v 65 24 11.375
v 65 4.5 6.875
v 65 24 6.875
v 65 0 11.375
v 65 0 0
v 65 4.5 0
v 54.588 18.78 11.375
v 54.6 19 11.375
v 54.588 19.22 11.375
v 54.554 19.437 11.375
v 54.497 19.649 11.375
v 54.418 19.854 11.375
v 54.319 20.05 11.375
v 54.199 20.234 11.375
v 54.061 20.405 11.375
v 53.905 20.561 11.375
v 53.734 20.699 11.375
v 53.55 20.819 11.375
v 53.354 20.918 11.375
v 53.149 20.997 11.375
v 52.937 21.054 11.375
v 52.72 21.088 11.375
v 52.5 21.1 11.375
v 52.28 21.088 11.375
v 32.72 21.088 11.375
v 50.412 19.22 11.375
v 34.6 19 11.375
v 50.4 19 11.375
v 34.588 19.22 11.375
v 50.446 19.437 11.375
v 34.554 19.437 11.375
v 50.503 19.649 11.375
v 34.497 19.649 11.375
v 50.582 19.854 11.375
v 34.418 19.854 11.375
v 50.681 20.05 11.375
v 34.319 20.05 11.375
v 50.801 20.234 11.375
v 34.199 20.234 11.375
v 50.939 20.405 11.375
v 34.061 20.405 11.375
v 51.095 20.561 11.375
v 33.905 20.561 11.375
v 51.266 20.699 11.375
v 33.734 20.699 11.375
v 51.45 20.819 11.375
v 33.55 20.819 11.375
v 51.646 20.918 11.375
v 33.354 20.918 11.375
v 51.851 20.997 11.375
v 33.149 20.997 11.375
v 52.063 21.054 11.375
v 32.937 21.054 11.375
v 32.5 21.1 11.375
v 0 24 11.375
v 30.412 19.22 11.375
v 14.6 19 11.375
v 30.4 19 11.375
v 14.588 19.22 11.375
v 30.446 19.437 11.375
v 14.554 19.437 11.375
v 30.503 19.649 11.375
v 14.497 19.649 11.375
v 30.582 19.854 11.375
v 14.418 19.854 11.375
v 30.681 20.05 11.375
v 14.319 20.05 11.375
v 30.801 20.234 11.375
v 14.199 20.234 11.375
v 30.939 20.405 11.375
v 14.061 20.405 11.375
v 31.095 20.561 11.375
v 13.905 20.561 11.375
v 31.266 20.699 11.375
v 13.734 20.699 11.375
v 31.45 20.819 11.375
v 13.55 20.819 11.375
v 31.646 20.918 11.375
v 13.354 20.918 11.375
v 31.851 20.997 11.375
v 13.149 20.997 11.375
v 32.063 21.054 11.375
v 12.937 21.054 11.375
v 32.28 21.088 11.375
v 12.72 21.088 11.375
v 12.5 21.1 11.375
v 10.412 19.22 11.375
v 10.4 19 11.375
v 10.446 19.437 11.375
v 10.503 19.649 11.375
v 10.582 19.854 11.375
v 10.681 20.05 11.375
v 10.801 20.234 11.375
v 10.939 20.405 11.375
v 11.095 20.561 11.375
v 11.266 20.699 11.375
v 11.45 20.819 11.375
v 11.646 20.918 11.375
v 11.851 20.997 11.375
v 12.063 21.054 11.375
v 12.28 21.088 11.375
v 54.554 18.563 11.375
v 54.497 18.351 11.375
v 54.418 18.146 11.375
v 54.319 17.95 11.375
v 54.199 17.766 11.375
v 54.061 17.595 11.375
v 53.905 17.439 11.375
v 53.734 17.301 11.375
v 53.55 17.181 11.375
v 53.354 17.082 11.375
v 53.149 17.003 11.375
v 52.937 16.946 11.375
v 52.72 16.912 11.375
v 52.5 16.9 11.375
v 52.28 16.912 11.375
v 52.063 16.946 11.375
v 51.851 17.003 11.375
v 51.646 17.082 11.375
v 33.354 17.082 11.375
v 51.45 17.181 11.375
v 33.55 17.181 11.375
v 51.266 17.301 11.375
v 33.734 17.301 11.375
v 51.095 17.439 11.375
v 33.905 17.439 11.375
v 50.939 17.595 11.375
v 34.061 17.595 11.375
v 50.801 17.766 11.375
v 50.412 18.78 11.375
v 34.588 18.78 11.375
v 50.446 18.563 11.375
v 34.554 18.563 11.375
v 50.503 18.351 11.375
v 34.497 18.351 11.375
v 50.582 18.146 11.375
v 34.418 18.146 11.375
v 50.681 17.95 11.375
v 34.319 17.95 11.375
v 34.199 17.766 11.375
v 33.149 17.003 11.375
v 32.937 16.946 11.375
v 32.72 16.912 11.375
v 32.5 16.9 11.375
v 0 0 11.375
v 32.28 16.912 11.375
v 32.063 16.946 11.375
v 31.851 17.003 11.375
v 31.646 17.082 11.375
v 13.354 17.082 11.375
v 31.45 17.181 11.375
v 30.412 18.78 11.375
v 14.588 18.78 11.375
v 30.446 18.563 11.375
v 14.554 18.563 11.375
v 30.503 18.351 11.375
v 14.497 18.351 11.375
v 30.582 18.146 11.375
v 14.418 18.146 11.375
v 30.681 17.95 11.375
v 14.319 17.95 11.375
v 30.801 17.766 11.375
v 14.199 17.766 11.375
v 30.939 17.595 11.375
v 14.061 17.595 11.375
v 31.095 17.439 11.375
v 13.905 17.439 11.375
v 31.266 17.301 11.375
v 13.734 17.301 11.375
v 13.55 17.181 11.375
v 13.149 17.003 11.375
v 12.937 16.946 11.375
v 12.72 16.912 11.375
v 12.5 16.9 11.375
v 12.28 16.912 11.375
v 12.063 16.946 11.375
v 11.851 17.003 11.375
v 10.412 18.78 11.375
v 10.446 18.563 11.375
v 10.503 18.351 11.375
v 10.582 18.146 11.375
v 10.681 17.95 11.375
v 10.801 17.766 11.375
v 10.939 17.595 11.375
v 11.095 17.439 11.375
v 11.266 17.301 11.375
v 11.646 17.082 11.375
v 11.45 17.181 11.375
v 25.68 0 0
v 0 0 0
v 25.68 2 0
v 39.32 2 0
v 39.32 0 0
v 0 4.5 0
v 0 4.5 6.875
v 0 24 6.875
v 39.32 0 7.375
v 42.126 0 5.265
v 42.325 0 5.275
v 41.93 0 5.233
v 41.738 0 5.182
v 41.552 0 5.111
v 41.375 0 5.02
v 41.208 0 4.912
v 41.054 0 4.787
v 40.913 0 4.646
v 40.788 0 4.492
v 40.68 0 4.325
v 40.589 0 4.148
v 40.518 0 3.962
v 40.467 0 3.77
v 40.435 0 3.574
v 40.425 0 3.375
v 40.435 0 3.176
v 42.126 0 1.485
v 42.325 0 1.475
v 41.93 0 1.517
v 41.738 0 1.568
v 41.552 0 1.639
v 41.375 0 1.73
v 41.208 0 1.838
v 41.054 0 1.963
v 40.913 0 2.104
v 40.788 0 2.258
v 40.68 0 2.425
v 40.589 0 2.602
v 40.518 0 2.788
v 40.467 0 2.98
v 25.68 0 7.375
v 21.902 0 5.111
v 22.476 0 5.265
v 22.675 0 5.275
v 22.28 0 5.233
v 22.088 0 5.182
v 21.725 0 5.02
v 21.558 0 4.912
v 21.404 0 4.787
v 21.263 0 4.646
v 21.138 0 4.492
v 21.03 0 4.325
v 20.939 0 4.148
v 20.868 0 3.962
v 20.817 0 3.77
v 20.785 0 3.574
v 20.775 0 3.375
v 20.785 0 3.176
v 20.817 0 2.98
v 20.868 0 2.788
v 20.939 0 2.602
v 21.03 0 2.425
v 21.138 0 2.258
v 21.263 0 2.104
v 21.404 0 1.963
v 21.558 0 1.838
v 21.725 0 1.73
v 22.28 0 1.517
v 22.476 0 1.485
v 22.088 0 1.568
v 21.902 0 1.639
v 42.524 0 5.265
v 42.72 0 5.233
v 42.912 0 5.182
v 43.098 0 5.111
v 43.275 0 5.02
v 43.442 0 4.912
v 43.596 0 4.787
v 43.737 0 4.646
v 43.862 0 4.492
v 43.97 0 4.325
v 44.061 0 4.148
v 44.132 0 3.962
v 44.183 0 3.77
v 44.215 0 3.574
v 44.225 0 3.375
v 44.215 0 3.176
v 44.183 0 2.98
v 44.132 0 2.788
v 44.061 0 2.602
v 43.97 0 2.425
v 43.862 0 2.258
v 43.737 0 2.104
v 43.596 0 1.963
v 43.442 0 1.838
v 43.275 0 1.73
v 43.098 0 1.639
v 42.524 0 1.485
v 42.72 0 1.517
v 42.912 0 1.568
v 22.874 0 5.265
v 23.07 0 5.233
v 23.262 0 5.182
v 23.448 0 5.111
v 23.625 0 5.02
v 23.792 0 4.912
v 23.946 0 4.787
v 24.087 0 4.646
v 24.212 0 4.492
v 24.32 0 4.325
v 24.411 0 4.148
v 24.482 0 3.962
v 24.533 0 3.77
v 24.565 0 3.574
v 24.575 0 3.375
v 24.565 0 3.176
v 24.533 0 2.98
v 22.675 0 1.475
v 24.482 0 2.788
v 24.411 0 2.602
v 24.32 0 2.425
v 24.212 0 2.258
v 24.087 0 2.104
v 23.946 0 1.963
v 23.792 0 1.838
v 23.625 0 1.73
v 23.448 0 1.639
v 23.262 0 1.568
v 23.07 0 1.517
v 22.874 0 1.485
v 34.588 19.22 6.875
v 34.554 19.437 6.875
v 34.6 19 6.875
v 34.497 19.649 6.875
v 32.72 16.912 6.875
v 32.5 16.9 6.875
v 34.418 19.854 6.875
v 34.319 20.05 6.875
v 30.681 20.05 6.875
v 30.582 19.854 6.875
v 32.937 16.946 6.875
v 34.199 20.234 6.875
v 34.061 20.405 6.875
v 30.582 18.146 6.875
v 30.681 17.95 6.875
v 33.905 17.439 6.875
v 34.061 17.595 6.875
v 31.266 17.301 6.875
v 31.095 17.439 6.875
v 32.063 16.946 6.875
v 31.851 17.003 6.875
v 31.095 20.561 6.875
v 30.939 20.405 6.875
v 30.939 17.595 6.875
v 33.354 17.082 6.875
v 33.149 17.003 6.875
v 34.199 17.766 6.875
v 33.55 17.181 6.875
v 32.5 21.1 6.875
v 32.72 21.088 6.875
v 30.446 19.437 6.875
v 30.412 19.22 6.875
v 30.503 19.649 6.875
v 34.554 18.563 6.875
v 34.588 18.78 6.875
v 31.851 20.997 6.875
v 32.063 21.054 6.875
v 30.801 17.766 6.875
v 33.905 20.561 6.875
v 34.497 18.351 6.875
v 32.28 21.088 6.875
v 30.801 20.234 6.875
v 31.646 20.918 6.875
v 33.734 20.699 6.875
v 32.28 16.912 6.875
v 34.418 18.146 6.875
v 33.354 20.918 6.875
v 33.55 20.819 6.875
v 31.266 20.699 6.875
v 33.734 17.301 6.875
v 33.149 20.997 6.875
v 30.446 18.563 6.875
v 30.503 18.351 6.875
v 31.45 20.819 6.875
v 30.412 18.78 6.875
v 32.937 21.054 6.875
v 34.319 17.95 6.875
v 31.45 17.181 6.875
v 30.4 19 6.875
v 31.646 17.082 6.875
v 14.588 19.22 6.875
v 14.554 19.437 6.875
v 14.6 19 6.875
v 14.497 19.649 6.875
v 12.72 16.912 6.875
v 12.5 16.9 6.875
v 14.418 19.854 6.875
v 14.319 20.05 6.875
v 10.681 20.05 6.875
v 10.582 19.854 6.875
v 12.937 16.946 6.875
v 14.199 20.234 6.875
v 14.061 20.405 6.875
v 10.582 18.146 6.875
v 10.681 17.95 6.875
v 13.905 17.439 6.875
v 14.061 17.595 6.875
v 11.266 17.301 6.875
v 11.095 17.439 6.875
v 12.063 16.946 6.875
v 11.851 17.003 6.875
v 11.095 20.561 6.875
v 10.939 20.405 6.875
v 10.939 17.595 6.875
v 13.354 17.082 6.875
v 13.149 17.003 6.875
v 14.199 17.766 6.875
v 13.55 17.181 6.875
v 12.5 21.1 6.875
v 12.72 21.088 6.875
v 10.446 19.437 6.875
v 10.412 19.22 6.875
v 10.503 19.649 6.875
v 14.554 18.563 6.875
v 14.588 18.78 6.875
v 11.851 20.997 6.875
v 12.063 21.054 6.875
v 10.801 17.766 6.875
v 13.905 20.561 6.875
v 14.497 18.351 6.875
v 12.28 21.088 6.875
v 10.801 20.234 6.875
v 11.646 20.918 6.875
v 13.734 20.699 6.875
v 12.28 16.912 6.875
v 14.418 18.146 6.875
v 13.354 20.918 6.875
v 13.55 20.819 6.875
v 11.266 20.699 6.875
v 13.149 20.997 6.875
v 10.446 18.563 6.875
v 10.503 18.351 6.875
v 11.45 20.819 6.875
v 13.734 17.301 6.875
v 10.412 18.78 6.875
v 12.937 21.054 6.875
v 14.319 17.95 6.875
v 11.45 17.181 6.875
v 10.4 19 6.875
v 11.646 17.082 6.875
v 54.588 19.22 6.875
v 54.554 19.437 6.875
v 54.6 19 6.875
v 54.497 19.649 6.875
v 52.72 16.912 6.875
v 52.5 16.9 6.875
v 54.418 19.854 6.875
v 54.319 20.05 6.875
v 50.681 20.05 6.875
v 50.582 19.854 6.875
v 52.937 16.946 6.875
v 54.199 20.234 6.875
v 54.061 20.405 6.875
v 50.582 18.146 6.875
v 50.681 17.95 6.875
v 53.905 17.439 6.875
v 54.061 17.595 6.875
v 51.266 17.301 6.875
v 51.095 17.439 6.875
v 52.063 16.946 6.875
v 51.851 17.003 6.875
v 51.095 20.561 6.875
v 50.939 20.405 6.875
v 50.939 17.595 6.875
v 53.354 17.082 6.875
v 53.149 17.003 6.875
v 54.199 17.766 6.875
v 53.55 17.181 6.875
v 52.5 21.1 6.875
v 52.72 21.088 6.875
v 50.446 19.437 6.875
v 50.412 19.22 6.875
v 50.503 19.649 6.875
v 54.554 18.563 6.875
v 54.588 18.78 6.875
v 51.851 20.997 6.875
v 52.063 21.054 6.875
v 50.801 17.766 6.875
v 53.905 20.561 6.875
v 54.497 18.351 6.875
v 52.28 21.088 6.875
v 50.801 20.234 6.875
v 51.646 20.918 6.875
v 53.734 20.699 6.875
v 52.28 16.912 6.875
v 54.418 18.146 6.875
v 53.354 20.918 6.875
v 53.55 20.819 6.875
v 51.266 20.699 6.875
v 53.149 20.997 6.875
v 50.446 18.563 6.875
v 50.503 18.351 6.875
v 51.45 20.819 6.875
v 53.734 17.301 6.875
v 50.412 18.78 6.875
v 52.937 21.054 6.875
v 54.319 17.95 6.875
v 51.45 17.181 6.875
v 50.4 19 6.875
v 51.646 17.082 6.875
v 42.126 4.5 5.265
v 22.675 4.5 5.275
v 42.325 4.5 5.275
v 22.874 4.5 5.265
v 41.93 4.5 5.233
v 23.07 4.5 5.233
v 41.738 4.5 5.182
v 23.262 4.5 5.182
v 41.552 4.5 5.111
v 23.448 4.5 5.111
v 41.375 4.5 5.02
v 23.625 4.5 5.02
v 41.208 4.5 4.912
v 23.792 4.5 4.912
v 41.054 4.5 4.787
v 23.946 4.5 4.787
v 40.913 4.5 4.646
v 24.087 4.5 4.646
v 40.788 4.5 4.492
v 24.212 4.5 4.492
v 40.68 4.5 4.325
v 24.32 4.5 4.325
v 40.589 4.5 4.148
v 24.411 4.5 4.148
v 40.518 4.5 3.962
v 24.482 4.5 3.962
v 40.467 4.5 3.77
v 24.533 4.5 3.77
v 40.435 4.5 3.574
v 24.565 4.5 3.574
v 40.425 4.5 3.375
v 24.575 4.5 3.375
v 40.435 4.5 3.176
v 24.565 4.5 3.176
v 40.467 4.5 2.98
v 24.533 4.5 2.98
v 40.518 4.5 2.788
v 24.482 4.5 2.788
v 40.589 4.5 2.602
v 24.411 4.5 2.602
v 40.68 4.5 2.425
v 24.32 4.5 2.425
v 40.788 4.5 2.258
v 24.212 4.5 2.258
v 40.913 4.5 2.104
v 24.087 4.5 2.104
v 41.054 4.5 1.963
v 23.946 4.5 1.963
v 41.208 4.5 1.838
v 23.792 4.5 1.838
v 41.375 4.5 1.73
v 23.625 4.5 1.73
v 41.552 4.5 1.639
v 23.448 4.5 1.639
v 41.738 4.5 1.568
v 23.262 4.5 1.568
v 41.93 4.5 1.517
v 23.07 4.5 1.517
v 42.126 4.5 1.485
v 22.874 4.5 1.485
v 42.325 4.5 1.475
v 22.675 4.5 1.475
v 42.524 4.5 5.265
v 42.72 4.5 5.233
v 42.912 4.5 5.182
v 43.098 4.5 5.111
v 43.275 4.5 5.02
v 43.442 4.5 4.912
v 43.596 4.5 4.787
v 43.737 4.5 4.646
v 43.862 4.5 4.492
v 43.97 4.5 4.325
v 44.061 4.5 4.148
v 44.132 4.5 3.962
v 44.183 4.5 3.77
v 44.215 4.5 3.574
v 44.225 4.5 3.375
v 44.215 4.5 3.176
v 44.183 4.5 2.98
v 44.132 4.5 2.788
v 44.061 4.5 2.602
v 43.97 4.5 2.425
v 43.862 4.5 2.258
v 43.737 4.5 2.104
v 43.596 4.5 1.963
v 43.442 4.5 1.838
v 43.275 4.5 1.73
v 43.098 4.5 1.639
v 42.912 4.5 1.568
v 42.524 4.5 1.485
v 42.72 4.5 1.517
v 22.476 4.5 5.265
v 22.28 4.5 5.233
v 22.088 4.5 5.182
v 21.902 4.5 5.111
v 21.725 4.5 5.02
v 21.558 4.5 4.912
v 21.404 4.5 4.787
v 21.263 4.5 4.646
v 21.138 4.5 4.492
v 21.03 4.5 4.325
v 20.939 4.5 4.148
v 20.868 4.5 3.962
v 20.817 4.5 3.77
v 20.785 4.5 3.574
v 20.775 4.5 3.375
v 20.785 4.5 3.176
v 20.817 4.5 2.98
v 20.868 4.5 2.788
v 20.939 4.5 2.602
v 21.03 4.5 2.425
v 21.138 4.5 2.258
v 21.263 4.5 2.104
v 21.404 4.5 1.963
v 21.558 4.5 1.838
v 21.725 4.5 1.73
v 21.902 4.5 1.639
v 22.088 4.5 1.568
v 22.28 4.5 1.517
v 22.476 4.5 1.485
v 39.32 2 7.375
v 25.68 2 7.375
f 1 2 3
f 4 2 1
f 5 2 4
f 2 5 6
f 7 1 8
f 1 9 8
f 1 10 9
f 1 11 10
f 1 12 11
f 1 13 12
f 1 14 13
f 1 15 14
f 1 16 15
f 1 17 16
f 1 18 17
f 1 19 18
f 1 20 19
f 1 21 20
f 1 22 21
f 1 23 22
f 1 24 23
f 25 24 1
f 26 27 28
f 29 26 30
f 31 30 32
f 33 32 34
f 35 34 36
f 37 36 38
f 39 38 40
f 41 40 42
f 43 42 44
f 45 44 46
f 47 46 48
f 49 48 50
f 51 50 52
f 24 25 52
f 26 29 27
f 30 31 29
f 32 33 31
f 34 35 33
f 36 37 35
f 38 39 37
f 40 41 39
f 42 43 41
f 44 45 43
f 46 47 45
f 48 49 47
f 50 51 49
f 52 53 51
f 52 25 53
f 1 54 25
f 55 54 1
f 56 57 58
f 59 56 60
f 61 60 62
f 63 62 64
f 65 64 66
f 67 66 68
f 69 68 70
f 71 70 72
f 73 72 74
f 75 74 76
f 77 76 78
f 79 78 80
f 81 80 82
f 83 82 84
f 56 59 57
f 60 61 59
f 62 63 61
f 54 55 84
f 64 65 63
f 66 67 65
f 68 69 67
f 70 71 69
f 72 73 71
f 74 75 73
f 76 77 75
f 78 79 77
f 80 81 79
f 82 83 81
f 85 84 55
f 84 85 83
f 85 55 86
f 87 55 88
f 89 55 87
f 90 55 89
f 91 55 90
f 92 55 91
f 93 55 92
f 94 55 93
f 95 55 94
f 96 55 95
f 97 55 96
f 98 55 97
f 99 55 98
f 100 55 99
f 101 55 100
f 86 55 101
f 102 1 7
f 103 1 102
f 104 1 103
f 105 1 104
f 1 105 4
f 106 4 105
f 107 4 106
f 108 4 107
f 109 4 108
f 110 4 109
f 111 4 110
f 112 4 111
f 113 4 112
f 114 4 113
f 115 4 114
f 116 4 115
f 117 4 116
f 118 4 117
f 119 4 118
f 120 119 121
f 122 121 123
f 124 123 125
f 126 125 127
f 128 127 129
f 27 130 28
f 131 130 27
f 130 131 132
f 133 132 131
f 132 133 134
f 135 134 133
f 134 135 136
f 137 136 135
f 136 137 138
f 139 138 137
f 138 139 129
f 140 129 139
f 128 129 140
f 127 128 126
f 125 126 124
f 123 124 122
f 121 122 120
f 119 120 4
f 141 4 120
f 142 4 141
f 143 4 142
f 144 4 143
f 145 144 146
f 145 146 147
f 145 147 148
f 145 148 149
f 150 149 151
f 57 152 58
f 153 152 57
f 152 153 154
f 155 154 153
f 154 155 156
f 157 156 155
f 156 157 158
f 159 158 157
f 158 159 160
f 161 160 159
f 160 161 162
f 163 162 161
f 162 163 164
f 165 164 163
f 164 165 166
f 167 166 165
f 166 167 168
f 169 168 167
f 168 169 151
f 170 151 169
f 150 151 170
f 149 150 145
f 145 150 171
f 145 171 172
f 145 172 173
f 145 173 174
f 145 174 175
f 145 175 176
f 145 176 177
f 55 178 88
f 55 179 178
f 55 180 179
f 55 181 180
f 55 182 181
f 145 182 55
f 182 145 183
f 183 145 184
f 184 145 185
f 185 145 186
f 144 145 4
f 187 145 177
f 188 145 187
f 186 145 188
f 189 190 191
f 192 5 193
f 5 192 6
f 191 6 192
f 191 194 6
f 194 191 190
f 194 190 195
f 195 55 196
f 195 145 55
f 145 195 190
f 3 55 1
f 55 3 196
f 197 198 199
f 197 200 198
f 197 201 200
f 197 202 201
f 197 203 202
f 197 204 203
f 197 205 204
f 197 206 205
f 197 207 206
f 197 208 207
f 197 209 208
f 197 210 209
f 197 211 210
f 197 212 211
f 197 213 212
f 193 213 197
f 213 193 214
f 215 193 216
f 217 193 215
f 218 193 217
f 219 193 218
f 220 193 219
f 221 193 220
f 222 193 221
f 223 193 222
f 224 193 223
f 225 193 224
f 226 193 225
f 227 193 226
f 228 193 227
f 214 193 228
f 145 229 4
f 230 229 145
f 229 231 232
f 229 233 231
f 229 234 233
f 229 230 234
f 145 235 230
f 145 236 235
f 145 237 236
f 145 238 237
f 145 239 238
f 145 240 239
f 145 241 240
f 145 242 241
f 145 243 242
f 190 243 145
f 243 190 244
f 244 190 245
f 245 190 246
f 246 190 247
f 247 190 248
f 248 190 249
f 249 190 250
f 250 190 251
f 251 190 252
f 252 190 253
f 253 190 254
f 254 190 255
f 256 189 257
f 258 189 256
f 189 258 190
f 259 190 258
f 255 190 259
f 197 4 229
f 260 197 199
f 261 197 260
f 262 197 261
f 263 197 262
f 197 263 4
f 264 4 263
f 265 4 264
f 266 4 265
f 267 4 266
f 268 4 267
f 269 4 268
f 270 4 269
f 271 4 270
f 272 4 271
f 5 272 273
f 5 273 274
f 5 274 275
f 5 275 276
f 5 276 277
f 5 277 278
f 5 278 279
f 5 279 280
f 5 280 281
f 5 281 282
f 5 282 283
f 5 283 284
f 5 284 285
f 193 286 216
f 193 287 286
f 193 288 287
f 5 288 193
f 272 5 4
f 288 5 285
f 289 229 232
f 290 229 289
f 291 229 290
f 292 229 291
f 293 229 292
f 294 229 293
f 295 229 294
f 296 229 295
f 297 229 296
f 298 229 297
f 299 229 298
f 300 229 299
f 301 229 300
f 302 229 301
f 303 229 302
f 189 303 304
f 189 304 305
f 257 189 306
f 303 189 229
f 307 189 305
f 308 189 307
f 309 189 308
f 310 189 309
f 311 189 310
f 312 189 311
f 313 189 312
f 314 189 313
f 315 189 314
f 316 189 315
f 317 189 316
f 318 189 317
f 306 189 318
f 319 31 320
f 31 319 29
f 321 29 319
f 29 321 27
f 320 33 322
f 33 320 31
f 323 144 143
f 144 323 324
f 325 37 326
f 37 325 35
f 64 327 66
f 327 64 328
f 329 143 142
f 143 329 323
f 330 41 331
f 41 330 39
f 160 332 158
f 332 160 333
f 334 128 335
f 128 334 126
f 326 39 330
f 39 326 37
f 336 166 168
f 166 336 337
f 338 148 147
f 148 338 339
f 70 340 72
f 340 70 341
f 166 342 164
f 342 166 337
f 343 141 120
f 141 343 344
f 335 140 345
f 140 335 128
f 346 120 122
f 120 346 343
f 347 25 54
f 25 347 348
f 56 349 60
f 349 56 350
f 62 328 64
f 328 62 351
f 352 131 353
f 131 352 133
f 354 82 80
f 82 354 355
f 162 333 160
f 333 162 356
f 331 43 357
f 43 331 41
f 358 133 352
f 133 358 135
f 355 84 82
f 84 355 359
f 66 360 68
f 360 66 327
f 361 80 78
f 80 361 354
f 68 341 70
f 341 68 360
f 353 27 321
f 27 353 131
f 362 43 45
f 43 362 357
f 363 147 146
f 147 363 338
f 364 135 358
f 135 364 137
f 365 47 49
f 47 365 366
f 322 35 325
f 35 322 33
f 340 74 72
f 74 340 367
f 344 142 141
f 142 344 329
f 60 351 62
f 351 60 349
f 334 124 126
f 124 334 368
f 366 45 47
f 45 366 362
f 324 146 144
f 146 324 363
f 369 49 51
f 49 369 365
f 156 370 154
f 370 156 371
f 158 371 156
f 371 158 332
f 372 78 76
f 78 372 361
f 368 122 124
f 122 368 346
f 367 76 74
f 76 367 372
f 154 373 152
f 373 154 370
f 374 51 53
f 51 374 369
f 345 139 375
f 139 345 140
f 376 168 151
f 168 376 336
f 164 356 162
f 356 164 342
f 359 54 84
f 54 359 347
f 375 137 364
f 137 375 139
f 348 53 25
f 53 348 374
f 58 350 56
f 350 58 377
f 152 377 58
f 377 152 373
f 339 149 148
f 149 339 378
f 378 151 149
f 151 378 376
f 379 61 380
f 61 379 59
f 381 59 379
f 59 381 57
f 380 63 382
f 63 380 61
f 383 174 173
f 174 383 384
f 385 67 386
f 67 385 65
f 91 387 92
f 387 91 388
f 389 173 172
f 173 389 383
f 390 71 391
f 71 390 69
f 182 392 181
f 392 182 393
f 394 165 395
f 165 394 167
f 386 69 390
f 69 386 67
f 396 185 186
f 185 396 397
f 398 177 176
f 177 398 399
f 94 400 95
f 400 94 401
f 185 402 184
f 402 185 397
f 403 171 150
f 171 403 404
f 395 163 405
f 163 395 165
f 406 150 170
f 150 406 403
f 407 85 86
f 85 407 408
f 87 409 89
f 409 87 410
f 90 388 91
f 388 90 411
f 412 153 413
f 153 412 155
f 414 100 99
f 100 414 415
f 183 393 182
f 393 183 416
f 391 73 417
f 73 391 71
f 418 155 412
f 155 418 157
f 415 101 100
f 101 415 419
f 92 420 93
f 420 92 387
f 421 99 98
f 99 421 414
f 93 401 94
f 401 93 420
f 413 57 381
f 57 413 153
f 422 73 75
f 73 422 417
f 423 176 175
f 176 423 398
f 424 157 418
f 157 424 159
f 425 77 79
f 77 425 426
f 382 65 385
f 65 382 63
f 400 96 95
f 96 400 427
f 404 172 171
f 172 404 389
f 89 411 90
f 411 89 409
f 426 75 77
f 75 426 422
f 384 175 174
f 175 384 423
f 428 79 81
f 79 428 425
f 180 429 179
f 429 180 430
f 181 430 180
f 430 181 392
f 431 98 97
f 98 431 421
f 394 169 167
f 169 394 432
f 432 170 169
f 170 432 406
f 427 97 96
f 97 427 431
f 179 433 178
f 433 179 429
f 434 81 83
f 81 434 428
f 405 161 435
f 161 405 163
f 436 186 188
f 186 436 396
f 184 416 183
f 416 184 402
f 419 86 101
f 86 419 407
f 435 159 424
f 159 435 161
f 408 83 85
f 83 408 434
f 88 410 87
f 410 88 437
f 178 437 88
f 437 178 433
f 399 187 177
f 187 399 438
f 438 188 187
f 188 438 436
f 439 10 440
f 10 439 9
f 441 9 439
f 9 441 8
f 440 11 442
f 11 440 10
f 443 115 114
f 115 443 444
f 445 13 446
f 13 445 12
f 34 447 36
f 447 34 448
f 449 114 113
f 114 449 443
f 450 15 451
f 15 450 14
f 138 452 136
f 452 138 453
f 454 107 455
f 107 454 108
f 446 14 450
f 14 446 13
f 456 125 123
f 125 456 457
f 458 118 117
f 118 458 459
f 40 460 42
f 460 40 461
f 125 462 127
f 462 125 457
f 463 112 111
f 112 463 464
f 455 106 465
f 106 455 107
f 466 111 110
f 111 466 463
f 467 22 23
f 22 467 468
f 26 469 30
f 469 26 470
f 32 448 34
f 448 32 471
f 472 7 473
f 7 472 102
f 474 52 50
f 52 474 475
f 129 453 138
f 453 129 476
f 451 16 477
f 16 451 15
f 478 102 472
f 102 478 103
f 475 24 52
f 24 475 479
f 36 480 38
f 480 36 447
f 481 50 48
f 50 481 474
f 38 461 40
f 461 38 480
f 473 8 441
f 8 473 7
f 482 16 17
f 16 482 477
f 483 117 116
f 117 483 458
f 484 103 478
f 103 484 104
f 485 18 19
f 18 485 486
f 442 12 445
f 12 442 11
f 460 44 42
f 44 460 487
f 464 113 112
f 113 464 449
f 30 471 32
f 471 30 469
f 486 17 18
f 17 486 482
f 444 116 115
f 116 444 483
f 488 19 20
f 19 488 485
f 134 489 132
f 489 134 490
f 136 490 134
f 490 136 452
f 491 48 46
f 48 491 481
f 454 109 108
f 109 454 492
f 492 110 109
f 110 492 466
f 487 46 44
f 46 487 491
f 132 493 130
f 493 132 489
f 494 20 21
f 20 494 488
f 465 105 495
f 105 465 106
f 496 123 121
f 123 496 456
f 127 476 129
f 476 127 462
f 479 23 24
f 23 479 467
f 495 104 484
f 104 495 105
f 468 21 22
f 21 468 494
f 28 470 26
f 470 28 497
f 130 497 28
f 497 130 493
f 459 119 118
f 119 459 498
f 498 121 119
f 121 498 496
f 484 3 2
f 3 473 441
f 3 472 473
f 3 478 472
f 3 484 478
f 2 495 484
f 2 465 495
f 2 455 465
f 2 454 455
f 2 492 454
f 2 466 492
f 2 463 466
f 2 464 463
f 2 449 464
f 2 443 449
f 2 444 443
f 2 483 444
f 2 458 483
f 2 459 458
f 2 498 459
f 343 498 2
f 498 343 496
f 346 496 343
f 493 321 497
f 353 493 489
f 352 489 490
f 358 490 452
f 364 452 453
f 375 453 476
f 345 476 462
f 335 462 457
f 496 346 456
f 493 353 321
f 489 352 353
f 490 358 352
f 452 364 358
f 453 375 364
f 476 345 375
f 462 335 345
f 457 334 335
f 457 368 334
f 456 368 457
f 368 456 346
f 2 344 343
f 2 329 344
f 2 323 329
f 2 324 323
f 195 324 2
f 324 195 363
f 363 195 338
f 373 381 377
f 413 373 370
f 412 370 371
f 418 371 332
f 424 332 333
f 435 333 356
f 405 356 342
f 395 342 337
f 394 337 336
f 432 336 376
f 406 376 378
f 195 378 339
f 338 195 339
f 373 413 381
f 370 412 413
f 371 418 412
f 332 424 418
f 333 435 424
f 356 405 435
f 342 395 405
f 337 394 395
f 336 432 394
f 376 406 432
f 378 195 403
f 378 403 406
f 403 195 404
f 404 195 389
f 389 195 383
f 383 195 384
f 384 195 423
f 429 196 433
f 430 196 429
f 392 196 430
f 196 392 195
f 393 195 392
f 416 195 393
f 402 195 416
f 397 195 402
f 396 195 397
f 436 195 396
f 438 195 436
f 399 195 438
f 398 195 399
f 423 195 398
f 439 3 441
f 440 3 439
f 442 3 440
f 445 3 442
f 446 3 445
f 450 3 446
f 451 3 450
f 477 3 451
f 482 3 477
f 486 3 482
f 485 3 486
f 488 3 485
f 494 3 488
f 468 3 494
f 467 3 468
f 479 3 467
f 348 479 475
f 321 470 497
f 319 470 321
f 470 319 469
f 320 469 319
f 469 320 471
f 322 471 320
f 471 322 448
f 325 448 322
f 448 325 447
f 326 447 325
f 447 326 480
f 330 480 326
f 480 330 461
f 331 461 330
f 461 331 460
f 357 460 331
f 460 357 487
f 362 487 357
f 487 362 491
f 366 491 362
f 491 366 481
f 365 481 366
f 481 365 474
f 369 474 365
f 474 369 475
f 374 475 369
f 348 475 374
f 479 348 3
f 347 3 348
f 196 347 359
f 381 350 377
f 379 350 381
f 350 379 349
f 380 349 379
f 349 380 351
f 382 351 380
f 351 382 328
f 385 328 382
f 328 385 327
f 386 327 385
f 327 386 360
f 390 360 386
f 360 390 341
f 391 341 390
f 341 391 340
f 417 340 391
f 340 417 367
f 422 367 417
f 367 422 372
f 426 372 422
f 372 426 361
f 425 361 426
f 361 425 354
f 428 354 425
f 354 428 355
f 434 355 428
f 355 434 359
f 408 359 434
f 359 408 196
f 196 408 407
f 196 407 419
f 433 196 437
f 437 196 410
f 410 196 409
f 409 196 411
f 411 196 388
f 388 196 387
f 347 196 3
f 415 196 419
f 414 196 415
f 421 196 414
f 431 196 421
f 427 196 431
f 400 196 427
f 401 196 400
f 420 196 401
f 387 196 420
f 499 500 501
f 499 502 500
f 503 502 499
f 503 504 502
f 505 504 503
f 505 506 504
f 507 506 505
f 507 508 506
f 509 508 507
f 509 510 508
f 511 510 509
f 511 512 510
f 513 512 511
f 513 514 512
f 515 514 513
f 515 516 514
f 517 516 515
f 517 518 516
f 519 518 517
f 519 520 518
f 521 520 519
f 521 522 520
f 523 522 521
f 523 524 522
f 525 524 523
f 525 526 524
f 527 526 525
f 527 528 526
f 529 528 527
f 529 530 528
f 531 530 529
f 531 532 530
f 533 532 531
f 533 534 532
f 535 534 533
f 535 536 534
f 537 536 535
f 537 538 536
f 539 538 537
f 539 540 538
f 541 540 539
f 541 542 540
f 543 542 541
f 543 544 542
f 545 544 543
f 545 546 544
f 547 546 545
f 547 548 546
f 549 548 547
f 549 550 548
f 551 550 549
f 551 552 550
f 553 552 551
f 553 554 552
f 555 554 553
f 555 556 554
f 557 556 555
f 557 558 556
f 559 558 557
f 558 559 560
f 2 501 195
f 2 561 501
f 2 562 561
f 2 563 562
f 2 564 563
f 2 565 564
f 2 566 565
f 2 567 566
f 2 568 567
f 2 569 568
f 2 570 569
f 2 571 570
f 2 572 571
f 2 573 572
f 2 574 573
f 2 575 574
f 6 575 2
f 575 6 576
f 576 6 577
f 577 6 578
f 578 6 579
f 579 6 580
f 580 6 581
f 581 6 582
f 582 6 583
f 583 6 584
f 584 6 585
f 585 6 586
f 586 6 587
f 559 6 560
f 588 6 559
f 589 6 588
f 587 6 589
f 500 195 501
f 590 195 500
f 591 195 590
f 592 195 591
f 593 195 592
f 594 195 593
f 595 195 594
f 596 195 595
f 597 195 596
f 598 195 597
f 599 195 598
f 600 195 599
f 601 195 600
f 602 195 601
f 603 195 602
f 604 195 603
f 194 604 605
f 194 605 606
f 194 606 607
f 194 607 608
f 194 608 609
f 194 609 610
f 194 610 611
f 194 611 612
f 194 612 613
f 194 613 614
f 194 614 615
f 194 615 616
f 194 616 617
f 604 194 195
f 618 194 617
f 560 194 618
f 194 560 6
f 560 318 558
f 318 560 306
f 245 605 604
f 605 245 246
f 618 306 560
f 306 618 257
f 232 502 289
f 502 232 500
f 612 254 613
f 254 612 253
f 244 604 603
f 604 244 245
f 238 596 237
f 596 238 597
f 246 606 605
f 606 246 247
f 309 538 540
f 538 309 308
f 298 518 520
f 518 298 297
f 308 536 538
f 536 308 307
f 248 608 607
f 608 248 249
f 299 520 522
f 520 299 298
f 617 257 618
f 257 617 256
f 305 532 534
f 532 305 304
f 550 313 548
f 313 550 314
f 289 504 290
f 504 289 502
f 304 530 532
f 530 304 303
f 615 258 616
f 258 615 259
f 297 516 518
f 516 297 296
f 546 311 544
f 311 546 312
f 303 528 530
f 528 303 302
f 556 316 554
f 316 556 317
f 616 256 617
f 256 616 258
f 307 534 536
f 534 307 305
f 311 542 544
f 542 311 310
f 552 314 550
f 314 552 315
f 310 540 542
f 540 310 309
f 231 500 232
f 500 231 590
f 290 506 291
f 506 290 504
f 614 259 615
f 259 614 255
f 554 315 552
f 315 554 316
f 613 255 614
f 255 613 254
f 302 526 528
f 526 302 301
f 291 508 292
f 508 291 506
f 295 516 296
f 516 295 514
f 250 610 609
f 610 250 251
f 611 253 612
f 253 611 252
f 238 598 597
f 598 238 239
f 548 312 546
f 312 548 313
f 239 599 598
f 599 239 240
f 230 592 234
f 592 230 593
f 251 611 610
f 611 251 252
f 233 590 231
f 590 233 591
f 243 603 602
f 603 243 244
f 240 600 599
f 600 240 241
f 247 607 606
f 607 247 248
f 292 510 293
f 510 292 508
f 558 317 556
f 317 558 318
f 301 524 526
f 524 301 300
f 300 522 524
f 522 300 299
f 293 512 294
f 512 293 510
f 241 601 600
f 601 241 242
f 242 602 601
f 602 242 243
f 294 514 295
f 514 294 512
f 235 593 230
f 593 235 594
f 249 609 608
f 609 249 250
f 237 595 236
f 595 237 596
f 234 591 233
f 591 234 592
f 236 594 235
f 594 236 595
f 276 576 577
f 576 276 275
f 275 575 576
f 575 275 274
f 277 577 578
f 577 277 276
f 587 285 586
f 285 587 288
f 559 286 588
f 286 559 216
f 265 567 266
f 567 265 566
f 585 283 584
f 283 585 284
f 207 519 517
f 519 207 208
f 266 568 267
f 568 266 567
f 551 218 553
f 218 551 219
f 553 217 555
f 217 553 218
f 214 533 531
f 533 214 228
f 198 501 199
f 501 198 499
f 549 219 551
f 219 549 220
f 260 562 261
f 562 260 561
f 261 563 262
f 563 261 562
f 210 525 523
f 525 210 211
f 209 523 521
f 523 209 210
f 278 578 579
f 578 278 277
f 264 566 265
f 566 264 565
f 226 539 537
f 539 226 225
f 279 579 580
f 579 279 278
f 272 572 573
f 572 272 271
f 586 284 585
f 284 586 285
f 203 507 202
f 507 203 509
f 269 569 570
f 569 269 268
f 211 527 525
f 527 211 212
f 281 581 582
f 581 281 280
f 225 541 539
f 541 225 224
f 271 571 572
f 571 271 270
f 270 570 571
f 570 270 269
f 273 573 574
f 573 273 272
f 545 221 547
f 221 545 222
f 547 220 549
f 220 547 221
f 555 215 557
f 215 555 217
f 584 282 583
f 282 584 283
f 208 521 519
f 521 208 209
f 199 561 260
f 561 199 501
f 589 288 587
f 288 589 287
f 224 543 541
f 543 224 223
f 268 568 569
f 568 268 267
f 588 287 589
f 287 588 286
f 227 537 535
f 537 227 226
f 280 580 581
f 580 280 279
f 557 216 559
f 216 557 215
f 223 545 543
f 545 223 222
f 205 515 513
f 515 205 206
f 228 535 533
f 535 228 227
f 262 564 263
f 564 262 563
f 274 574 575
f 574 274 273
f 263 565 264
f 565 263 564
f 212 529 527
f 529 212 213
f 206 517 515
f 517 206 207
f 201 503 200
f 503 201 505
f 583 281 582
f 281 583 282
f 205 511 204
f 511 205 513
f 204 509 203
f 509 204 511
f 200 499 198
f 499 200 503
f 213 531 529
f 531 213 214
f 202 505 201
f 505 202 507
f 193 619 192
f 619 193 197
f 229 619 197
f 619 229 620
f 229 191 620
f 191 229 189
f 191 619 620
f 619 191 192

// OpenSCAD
//holder for vl530lo sensor module
$fn = 60;
module_height = 10.75;
module_width = 25; //includes mounting holes
module_core = 15.64; //pcb width excluding mounting holes
module_hole_center = module_width/2 - 1.2 - 2.95/2; // from center to center of mounting hole
mount_hole_dia = 3.8;
screw_cap_dia = 5.3;
screw_cap_depth = 3.3;
mount_width = 65; //rear dimension, spans 3 holes in plate
mount_depth = 24; // from front edge to > 3 mm behind first row of holes
mount_height = module_height/2 + 6; // leaves 3 mm above and below holes minimum

difference(){
    //main body
    cube([mount_width, mount_depth, mount_height]);
    translate([mount_width/2, 19, 0]){
        cylinder(h = mount_depth, r = mount_hole_dia/2+0.2, center = false);
        //cylinder(h = 3.2, r = 5.5/2, center = false);
    }
    translate([mount_width/2-20, 19, 0]){
        cylinder(h = mount_depth, r = mount_hole_dia/2+0.2, center = false);
        //cylinder(h = 3.2, r = 5.5/2, center = false);
    }

    translate([mount_width/2+20, 19, 0]){
        cylinder(h = mount_depth, r = mount_hole_dia/2+0.2, center = false);
        //cylinder(h = 3.2, r = 5.5/2, center = false);
    }
    
    translate([0, screw_cap_depth + 1.2, 0])
        cube([mount_width, mount_depth, mount_height - screw_cap_depth - 1.2]);
    
    //mount holes for module
    translate([mount_width/2 - module_hole_center,0., module_height/2 - 2]){
    rotate([-90, 0, 0]){
       cylinder(h = mount_depth, r = mount_hole_dia/2, center = false);
        //cylinder(h = 3.2, r = 5.5/2, center = false);
    }} 
    translate([mount_width/2 + module_hole_center, 0., module_height/2-2]){
    rotate([-90, 0, 0]){
       cylinder(h = mount_depth, r = mount_hole_dia/2, center = false);
        //cylinder(h = 3.2, r = 5.5/2, center = false);
    }}
    //clearance for smd components on reverse of module
    translate([mount_width/2 - module_core/2+1, 0, 0])
        cube([module_core-2, 2, module_height/2+2]);
}
